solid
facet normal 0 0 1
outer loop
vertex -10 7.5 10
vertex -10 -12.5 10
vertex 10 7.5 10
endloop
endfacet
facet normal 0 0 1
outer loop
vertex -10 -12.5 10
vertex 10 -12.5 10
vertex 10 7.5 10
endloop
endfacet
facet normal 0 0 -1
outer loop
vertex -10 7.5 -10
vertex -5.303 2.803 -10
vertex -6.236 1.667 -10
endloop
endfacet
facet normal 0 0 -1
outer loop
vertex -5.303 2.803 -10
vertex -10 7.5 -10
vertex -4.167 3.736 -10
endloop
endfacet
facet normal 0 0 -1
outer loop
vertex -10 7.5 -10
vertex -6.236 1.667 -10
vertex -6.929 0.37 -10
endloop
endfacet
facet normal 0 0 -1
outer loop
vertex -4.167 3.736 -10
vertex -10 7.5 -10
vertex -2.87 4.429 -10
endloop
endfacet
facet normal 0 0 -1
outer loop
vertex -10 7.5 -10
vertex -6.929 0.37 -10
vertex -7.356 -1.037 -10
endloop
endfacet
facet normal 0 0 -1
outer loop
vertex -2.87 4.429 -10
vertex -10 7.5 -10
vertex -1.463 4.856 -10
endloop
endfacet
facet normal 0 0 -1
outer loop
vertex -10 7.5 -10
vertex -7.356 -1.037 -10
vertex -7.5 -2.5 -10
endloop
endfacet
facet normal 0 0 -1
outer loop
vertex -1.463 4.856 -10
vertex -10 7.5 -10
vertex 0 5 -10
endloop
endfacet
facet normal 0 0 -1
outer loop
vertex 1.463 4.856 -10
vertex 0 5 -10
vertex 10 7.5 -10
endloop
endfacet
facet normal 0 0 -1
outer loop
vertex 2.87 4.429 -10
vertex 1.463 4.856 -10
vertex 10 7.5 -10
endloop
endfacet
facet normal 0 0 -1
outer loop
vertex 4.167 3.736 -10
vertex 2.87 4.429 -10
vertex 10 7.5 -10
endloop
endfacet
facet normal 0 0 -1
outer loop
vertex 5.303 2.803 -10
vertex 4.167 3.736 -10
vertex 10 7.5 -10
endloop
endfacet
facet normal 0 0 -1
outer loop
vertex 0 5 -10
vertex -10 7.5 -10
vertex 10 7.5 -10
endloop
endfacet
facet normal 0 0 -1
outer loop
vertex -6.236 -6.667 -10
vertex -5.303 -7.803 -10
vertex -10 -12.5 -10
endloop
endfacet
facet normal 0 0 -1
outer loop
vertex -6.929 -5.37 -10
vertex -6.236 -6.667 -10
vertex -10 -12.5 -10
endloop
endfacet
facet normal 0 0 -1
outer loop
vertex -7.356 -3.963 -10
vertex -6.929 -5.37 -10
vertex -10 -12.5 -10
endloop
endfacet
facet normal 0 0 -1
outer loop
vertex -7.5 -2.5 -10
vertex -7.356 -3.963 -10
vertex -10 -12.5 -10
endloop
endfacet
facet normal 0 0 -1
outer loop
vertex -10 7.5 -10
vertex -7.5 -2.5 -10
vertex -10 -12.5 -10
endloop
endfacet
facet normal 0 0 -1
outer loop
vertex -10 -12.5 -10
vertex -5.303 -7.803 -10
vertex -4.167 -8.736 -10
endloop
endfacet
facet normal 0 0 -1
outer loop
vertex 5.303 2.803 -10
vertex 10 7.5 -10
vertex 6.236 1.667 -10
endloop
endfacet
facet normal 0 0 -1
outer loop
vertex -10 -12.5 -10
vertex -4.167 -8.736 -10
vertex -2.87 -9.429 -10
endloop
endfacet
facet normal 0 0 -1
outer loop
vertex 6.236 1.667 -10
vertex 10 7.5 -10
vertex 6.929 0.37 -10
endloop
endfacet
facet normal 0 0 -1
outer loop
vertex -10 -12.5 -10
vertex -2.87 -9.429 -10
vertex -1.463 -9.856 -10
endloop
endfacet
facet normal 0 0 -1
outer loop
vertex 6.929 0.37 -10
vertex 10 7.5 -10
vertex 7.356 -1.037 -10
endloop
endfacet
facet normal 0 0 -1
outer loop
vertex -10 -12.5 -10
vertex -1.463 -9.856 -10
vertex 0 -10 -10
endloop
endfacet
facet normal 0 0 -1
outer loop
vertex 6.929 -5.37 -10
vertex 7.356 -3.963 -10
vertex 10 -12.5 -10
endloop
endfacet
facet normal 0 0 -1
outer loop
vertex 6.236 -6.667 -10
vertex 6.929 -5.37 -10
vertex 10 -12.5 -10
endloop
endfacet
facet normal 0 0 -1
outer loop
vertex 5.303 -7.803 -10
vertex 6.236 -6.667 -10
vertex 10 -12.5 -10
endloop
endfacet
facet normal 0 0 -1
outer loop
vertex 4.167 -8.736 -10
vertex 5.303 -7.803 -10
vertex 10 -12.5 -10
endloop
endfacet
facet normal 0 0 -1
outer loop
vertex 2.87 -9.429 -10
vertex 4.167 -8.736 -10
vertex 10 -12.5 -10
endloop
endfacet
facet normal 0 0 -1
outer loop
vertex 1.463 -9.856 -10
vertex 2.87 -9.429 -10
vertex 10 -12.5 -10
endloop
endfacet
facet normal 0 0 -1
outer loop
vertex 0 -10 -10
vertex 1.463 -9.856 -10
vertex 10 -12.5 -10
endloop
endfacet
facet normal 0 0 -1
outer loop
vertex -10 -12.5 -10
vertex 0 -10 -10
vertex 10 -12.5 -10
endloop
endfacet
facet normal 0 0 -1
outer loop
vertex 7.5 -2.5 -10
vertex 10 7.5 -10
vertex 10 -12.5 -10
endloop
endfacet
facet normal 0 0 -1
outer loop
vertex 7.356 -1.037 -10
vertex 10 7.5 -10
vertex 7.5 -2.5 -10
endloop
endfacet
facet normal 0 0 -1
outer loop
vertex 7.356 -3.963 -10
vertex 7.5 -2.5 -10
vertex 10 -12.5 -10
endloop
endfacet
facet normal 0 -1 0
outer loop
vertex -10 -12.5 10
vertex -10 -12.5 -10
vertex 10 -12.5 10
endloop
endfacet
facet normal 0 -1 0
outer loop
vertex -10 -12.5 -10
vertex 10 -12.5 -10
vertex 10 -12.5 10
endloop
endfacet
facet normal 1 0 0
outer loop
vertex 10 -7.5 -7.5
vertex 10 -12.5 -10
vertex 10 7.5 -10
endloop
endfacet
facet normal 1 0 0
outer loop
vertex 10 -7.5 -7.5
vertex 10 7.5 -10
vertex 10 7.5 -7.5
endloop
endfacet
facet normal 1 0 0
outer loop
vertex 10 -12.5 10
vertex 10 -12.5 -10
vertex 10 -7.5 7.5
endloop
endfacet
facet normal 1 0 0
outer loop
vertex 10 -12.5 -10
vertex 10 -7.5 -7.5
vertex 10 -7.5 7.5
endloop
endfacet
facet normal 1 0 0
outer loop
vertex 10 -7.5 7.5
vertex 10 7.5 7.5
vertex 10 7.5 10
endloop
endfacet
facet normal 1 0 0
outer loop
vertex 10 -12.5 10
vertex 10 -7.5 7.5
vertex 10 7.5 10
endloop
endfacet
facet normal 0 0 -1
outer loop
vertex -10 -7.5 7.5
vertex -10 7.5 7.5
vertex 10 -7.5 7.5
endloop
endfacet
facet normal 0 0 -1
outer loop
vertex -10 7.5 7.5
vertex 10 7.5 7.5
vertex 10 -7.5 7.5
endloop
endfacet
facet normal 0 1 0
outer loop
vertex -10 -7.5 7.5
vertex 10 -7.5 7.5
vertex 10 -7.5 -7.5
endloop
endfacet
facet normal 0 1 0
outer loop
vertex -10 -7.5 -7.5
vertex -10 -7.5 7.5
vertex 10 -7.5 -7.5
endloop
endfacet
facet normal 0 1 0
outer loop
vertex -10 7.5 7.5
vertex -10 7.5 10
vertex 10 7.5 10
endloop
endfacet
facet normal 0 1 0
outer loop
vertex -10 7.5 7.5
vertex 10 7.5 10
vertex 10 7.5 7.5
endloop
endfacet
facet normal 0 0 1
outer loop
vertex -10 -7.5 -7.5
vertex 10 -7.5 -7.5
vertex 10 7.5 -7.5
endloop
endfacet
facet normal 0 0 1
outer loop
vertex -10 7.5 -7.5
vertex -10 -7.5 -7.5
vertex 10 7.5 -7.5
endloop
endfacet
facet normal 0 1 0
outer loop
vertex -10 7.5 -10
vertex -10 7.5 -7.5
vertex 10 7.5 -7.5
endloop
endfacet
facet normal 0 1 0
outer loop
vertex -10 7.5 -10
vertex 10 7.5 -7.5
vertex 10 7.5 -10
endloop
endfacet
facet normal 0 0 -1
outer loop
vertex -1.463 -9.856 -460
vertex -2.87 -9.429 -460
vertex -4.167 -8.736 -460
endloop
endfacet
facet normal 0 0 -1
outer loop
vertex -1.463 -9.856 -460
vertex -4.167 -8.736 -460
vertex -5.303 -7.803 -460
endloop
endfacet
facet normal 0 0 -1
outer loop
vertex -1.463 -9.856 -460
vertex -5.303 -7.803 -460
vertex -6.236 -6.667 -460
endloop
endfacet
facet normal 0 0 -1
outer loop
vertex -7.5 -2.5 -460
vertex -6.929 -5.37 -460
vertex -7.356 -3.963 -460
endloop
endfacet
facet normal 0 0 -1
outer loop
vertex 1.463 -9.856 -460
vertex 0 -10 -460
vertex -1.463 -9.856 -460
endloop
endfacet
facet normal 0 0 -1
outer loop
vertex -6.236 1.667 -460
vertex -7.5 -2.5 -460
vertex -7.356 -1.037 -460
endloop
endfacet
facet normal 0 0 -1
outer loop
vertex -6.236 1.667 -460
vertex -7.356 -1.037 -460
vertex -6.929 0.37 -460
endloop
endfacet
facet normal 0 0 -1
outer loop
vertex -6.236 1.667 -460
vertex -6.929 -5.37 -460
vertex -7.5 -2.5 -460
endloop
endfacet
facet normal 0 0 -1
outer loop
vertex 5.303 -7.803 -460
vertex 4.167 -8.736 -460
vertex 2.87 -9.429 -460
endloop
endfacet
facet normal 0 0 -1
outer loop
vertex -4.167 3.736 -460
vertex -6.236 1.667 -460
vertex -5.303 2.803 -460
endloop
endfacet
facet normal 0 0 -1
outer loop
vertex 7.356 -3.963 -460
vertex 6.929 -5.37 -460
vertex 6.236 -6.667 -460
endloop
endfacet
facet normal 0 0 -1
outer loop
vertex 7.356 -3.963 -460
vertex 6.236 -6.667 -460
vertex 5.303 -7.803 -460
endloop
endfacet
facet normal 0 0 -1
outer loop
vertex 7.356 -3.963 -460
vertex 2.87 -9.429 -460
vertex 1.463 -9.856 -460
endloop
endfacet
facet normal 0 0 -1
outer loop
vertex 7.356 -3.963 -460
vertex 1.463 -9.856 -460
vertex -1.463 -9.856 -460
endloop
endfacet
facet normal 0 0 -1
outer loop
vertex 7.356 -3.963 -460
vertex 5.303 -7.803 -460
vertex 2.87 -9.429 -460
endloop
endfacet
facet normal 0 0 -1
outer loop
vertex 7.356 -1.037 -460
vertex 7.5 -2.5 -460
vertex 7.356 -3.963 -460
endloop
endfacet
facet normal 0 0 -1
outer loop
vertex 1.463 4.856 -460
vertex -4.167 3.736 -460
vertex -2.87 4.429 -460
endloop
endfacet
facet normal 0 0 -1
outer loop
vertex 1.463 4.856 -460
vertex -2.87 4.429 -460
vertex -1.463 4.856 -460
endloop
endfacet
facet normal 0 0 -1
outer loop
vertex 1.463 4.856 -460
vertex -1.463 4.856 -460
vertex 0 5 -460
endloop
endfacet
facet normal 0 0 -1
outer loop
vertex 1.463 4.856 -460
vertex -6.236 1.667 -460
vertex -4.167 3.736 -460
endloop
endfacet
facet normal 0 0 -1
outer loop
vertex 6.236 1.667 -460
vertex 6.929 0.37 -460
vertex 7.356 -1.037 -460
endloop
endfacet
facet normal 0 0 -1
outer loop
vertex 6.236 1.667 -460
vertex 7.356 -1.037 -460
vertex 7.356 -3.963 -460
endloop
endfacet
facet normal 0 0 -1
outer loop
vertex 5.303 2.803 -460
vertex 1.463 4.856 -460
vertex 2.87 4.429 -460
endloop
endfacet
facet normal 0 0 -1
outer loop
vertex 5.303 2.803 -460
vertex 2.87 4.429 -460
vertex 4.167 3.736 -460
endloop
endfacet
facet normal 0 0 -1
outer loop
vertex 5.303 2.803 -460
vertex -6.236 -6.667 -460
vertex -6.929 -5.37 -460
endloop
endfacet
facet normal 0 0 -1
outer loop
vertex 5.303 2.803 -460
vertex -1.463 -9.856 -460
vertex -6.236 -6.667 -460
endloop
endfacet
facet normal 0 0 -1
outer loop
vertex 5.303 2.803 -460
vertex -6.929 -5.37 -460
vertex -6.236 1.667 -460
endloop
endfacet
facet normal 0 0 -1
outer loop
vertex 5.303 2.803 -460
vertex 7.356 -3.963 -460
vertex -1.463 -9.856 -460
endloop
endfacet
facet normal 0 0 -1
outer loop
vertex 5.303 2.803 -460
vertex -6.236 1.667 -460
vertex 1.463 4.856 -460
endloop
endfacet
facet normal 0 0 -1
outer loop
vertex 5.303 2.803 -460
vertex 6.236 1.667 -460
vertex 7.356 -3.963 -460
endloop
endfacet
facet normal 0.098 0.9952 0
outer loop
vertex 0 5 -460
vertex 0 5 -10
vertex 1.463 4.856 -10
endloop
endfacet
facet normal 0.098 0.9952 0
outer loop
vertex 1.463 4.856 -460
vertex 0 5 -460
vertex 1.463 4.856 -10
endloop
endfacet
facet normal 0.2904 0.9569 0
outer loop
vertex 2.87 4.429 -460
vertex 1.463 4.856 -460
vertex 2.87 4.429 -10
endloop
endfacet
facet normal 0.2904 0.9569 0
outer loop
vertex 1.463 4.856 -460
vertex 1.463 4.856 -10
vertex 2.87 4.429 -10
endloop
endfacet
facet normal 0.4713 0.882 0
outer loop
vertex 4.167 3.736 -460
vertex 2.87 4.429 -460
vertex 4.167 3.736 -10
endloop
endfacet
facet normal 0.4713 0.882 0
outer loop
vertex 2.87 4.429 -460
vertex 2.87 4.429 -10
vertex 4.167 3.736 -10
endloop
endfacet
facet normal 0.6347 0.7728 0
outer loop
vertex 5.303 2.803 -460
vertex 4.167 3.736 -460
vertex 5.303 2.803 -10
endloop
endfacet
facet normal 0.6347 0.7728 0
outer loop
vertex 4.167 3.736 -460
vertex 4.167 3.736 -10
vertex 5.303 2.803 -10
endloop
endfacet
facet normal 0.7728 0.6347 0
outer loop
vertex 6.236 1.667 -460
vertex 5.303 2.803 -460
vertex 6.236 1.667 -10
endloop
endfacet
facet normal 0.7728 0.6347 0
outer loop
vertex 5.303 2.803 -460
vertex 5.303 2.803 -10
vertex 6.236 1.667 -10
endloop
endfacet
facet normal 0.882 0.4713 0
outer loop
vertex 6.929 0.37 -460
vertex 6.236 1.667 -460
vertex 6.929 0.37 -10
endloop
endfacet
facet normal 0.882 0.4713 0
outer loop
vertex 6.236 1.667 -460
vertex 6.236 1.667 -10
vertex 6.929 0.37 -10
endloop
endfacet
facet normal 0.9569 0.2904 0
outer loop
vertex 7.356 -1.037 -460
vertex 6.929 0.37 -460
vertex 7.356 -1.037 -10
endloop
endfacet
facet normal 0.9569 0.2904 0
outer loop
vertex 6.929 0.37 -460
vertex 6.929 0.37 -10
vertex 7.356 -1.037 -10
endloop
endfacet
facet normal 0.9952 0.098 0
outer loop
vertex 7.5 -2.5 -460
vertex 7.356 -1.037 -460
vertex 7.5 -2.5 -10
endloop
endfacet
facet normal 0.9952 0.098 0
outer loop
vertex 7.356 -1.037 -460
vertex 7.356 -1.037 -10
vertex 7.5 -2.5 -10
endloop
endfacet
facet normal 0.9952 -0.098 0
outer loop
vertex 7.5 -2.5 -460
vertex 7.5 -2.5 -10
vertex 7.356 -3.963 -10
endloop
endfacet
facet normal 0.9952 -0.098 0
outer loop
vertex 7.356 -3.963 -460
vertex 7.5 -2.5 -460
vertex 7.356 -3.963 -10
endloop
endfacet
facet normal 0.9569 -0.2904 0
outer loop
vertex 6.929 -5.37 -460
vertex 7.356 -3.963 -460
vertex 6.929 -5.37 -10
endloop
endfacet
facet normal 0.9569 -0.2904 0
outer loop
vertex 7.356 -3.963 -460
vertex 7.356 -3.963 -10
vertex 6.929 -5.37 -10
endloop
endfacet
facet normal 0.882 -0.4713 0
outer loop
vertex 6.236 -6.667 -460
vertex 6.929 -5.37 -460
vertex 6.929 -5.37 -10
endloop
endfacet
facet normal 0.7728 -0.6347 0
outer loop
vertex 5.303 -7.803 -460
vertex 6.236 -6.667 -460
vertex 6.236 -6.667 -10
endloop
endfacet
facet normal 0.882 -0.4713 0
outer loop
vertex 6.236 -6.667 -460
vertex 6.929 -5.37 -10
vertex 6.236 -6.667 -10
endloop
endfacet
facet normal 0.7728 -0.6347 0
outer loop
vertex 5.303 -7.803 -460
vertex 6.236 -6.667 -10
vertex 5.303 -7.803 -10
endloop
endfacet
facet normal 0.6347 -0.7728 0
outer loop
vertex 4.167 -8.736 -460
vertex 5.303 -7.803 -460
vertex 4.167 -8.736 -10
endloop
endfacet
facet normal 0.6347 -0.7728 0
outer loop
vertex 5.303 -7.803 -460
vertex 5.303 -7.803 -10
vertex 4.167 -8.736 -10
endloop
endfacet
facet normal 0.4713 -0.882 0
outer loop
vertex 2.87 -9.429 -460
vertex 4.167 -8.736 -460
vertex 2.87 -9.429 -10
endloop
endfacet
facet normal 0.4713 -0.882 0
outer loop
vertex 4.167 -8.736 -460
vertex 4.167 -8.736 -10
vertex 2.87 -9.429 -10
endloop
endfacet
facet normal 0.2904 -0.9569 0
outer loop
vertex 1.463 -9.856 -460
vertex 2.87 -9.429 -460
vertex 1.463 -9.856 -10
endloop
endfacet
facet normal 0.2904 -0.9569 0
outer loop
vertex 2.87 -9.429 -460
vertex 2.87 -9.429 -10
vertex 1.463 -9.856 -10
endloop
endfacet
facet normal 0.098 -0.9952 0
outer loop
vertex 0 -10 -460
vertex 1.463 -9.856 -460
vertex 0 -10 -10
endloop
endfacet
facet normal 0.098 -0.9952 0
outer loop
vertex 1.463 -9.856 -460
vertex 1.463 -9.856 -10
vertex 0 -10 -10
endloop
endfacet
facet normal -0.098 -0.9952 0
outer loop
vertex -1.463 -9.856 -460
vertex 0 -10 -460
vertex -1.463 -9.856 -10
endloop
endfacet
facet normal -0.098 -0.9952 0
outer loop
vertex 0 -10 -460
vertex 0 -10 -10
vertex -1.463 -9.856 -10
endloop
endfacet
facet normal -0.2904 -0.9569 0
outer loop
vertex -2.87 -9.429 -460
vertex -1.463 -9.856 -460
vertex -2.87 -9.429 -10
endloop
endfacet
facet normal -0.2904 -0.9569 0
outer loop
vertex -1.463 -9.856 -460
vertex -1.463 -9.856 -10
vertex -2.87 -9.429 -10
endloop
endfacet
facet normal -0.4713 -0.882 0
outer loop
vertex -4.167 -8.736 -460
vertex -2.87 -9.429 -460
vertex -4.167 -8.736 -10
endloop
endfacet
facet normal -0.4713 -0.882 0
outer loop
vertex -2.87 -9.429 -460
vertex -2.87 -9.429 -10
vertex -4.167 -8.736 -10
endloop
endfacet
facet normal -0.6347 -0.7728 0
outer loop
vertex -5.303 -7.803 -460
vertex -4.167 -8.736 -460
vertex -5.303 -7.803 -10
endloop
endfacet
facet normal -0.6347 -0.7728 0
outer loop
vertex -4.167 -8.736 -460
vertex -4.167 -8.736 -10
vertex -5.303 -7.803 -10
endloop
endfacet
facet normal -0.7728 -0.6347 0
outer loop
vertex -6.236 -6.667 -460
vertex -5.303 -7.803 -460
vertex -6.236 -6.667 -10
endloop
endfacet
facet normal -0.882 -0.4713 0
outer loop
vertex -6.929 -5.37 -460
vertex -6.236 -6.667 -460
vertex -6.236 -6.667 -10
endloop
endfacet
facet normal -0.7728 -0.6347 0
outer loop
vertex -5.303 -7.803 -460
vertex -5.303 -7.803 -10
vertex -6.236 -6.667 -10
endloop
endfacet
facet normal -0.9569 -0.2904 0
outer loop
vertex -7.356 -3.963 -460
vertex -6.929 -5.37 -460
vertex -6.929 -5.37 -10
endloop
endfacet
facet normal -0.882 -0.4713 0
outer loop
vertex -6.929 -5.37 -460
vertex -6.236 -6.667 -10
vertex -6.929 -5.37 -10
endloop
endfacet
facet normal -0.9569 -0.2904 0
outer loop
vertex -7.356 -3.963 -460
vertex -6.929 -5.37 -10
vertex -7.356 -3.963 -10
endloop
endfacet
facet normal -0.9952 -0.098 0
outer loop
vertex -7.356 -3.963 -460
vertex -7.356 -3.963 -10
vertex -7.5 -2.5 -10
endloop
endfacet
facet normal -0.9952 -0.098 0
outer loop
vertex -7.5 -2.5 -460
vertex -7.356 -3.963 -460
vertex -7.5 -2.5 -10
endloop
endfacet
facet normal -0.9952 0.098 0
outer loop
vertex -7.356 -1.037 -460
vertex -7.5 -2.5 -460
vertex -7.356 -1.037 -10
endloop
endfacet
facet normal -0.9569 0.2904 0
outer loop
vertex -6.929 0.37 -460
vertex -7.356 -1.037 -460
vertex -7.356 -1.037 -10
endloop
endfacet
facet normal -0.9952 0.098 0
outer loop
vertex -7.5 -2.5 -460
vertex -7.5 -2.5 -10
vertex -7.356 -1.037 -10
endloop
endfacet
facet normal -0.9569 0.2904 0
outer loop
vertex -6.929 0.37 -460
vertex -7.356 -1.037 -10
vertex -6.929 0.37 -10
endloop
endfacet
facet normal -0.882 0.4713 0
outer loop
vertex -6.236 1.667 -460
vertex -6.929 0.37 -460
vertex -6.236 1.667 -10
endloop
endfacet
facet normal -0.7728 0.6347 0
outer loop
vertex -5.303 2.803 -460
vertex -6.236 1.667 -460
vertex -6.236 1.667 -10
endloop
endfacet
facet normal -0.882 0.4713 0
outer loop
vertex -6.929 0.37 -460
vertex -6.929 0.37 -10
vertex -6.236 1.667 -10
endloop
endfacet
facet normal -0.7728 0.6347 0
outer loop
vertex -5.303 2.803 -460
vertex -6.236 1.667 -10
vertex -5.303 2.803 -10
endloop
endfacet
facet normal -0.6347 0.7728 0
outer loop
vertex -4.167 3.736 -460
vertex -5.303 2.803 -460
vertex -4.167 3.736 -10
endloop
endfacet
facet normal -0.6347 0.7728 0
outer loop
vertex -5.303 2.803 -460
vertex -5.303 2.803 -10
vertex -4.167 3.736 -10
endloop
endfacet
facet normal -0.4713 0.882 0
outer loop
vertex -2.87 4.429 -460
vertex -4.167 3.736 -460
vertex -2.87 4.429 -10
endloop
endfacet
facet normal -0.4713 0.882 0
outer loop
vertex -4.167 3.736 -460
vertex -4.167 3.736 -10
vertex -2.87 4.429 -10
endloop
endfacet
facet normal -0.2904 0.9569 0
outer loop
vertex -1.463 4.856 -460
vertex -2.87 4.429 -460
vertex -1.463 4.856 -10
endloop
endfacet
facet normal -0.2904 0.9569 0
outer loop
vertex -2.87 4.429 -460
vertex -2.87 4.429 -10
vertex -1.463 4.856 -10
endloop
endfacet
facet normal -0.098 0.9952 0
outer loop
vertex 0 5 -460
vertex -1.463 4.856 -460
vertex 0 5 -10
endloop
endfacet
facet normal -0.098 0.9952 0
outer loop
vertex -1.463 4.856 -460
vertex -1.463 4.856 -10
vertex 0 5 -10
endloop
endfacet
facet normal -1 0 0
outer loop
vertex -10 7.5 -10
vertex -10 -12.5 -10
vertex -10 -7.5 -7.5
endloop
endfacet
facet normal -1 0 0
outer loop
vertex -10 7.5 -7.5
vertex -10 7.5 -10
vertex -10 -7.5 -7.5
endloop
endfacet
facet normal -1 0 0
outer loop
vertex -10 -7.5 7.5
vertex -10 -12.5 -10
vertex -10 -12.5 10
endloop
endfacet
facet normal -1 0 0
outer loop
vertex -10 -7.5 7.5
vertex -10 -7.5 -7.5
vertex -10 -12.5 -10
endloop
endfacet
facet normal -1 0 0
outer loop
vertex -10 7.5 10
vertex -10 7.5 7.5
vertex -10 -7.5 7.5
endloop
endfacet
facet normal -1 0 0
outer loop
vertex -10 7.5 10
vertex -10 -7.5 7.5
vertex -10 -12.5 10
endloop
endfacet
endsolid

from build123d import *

# Parameters (mm, degrees)
BOSS_EXTRUDE1_DEPTH = 10
SKETCH4_R           = 7.5
BOSS_EXTRUDE2_DEPTH = 450


with BuildPart() as part:
    # Sketch2 → Boss-Extrude1 (new, symmetric)
    with BuildSketch(Plane(origin=(0, 0, 0), x_dir=(0, 0, -1), z_dir=(1, 0, 0))):
        Polygon((7.5, 7.5), (10, 7.5), (10, -12.5), (-10, -12.5), (-10, 7.5), (-7.5, 7.5), (-7.5, -7.5), (7.5, -7.5), align=None)
    extrude(amount=BOSS_EXTRUDE1_DEPTH, both=True)

    # Sketch4 → Boss-Extrude2 (add)
    with BuildSketch(Plane(origin=(0, 0, -10), x_dir=(-1, 0, 0), z_dir=(0, 0, -1))):
        with Locations(Location((0, -2.5, 0), (0, 0, 90))):
            Circle(SKETCH4_R)
    extrude(amount=BOSS_EXTRUDE2_DEPTH)


solid = part.part
